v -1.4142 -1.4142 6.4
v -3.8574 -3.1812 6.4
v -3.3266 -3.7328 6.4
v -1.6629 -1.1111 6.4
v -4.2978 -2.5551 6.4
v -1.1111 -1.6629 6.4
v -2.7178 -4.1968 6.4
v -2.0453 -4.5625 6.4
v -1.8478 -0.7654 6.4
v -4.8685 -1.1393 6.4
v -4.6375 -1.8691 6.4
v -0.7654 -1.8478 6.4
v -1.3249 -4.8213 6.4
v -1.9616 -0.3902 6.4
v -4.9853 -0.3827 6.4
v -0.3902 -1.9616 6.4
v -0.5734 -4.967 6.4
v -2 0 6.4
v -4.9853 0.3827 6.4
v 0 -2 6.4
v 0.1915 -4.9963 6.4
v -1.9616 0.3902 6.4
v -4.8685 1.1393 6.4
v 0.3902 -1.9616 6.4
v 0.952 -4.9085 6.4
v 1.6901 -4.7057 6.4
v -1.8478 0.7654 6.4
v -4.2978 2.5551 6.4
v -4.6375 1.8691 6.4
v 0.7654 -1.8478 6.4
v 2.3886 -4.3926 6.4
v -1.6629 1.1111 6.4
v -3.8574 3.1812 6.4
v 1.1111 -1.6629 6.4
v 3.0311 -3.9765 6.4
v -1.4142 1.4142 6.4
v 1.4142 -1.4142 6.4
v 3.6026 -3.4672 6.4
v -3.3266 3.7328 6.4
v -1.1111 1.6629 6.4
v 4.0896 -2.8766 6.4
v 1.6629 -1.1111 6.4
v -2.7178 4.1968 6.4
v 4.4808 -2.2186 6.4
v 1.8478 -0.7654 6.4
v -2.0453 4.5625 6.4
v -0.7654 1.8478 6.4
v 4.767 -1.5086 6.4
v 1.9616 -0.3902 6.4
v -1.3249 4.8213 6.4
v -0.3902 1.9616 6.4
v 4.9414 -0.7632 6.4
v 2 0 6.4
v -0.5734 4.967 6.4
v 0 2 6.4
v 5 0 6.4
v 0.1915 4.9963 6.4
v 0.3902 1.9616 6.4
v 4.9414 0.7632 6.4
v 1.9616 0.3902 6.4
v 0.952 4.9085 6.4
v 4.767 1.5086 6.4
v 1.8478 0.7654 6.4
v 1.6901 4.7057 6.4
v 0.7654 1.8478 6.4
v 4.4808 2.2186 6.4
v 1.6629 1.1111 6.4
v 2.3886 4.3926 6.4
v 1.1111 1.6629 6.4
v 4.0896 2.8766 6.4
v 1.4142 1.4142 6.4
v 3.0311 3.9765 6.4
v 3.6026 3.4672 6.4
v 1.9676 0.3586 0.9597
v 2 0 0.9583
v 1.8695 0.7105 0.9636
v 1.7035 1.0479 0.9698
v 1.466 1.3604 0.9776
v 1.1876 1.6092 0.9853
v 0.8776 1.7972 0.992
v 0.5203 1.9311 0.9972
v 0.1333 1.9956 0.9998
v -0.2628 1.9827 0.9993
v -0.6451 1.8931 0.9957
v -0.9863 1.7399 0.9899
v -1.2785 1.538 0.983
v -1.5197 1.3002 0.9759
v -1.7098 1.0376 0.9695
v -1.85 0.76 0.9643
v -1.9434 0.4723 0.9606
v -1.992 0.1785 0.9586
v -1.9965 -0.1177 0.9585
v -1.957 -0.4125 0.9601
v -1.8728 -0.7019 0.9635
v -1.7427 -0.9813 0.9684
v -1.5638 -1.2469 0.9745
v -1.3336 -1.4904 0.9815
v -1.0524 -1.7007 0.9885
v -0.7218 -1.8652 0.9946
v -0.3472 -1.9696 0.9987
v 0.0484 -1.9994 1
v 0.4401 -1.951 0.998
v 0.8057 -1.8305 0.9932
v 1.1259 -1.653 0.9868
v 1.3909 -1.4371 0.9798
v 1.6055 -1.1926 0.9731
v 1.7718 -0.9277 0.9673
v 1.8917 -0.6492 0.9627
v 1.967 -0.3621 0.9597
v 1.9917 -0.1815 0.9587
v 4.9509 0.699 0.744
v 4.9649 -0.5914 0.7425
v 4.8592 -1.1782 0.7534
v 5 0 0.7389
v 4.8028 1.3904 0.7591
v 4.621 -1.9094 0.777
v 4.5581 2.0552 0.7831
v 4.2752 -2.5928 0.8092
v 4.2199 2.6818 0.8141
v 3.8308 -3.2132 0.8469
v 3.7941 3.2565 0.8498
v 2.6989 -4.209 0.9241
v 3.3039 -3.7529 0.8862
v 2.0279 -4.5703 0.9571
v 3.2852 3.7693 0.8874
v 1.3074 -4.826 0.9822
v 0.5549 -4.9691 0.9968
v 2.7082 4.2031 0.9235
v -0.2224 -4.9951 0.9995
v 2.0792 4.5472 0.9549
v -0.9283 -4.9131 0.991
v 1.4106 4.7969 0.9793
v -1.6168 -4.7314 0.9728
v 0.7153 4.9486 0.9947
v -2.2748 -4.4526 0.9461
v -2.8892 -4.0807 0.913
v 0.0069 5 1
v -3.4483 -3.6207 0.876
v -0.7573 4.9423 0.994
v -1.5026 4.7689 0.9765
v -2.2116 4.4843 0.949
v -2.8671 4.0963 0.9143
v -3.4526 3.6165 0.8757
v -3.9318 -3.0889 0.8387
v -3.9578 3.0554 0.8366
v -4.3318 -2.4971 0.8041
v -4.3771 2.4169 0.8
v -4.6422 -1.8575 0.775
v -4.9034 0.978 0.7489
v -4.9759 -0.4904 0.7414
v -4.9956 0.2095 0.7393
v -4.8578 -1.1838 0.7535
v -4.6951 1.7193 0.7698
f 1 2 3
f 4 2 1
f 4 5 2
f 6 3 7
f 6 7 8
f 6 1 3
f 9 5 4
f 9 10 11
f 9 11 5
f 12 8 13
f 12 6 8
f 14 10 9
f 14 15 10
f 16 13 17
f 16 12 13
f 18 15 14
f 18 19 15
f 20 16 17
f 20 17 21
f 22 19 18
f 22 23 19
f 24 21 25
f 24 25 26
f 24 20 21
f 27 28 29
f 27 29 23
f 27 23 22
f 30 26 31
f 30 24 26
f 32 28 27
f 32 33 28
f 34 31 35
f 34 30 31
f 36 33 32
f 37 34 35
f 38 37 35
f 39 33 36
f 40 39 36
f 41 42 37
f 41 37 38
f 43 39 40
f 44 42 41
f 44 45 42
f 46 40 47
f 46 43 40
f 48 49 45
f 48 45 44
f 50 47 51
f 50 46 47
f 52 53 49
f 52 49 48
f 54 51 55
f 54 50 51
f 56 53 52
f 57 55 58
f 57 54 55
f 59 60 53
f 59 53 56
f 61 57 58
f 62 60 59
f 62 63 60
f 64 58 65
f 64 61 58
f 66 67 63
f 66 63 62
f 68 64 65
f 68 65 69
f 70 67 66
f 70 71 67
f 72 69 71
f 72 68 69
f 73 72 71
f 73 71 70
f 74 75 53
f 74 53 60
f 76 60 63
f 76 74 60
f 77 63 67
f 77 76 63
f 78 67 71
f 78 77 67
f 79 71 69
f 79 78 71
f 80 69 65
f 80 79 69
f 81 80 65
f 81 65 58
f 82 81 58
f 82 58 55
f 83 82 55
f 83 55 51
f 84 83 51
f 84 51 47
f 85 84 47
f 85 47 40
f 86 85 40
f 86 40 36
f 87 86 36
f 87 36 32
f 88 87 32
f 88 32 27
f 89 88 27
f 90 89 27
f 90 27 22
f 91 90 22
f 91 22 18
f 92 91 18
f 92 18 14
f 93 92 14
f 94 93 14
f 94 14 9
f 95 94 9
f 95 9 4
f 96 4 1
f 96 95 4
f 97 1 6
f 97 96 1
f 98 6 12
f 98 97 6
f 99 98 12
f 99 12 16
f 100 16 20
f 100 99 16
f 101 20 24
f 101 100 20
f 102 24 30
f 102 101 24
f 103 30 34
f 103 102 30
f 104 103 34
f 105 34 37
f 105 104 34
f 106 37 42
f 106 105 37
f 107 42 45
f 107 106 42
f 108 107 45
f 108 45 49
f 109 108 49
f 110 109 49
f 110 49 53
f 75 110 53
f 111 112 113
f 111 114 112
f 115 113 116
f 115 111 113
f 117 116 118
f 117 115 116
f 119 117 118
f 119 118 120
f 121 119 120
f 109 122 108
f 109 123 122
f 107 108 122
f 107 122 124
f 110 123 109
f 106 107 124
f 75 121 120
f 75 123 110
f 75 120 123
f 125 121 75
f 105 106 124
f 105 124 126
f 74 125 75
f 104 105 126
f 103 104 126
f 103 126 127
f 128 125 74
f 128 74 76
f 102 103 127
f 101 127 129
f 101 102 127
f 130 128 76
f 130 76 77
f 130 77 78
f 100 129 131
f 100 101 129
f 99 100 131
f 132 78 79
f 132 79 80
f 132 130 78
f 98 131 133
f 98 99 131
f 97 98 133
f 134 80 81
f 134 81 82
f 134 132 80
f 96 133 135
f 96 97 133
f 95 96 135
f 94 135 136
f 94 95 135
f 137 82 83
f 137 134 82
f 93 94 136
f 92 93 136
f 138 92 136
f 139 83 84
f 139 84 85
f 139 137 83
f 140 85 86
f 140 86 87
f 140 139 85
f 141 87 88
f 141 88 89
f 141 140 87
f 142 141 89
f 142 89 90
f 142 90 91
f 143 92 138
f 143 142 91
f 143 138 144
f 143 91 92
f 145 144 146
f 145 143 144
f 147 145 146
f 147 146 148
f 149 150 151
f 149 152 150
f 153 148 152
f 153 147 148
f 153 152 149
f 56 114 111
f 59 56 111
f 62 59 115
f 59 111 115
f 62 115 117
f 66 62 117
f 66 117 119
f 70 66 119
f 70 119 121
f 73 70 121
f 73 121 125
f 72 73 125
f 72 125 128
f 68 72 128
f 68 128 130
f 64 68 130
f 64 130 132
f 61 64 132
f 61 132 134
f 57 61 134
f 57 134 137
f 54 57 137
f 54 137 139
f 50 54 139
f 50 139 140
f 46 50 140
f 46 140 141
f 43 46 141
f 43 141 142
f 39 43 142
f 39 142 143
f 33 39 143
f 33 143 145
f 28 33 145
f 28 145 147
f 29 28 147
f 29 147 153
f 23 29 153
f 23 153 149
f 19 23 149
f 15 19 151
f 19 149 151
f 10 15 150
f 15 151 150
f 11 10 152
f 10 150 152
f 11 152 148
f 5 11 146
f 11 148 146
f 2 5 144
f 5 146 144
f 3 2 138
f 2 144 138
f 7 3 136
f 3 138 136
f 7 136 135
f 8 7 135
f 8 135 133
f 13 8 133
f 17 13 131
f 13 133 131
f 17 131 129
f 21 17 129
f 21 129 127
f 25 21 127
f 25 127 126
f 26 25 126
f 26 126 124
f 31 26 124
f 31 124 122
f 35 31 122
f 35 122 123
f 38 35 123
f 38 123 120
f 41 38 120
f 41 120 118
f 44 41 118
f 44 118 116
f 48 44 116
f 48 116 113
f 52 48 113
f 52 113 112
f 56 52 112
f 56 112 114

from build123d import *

# Parameters (mm, degrees)
CYLINDER003_R          = 48
CYLINDER003_DEPTH      = 245
CYLINDER003_ROLL_ANGLE = 90
CYLINDER001_R          = 2
CYLINDER001_DEPTH      = 6.4
CYLINDER_R             = 5
CYLINDER_DEPTH         = 6.4


with BuildPart() as cilindro:
    # Cylinder003 → Cylinder003 (new body)
    with BuildSketch(Plane.XY):
        Circle(CYLINDER003_R)
    extrude(amount=CYLINDER003_DEPTH)


with BuildPart() as cilindro_1:
    # Cylinder003 roll: moved
    add(cilindro.part.rotate(Axis((0, 0, 0), (1, 0, 0)), CYLINDER003_ROLL_ANGLE))


with BuildPart() as cilindro_2:
    # Cylinder003 placement: moved
    add(cilindro_1.part.moved(Location((0, 79, -47))))


with BuildPart() as bumper_taladro:
    # Cylinder001 → Cylinder001 (new body)
    with BuildSketch(Plane.XY):
        Circle(CYLINDER001_R)
    extrude(amount=CYLINDER001_DEPTH)


with BuildPart() as bumper_para_m2_temporal:
    # Cylinder → Cylinder (new body)
    with BuildSketch(Plane.XY):
        Circle(CYLINDER_R)
    extrude(amount=CYLINDER_DEPTH)

    # Cut: cut Bumper taladro
    add(bumper_taladro.part, mode=Mode.SUBTRACT)

    # Cut001: cut Cilindro
    add(cilindro_2.part, mode=Mode.SUBTRACT)


solid = bumper_para_m2_temporal.part
